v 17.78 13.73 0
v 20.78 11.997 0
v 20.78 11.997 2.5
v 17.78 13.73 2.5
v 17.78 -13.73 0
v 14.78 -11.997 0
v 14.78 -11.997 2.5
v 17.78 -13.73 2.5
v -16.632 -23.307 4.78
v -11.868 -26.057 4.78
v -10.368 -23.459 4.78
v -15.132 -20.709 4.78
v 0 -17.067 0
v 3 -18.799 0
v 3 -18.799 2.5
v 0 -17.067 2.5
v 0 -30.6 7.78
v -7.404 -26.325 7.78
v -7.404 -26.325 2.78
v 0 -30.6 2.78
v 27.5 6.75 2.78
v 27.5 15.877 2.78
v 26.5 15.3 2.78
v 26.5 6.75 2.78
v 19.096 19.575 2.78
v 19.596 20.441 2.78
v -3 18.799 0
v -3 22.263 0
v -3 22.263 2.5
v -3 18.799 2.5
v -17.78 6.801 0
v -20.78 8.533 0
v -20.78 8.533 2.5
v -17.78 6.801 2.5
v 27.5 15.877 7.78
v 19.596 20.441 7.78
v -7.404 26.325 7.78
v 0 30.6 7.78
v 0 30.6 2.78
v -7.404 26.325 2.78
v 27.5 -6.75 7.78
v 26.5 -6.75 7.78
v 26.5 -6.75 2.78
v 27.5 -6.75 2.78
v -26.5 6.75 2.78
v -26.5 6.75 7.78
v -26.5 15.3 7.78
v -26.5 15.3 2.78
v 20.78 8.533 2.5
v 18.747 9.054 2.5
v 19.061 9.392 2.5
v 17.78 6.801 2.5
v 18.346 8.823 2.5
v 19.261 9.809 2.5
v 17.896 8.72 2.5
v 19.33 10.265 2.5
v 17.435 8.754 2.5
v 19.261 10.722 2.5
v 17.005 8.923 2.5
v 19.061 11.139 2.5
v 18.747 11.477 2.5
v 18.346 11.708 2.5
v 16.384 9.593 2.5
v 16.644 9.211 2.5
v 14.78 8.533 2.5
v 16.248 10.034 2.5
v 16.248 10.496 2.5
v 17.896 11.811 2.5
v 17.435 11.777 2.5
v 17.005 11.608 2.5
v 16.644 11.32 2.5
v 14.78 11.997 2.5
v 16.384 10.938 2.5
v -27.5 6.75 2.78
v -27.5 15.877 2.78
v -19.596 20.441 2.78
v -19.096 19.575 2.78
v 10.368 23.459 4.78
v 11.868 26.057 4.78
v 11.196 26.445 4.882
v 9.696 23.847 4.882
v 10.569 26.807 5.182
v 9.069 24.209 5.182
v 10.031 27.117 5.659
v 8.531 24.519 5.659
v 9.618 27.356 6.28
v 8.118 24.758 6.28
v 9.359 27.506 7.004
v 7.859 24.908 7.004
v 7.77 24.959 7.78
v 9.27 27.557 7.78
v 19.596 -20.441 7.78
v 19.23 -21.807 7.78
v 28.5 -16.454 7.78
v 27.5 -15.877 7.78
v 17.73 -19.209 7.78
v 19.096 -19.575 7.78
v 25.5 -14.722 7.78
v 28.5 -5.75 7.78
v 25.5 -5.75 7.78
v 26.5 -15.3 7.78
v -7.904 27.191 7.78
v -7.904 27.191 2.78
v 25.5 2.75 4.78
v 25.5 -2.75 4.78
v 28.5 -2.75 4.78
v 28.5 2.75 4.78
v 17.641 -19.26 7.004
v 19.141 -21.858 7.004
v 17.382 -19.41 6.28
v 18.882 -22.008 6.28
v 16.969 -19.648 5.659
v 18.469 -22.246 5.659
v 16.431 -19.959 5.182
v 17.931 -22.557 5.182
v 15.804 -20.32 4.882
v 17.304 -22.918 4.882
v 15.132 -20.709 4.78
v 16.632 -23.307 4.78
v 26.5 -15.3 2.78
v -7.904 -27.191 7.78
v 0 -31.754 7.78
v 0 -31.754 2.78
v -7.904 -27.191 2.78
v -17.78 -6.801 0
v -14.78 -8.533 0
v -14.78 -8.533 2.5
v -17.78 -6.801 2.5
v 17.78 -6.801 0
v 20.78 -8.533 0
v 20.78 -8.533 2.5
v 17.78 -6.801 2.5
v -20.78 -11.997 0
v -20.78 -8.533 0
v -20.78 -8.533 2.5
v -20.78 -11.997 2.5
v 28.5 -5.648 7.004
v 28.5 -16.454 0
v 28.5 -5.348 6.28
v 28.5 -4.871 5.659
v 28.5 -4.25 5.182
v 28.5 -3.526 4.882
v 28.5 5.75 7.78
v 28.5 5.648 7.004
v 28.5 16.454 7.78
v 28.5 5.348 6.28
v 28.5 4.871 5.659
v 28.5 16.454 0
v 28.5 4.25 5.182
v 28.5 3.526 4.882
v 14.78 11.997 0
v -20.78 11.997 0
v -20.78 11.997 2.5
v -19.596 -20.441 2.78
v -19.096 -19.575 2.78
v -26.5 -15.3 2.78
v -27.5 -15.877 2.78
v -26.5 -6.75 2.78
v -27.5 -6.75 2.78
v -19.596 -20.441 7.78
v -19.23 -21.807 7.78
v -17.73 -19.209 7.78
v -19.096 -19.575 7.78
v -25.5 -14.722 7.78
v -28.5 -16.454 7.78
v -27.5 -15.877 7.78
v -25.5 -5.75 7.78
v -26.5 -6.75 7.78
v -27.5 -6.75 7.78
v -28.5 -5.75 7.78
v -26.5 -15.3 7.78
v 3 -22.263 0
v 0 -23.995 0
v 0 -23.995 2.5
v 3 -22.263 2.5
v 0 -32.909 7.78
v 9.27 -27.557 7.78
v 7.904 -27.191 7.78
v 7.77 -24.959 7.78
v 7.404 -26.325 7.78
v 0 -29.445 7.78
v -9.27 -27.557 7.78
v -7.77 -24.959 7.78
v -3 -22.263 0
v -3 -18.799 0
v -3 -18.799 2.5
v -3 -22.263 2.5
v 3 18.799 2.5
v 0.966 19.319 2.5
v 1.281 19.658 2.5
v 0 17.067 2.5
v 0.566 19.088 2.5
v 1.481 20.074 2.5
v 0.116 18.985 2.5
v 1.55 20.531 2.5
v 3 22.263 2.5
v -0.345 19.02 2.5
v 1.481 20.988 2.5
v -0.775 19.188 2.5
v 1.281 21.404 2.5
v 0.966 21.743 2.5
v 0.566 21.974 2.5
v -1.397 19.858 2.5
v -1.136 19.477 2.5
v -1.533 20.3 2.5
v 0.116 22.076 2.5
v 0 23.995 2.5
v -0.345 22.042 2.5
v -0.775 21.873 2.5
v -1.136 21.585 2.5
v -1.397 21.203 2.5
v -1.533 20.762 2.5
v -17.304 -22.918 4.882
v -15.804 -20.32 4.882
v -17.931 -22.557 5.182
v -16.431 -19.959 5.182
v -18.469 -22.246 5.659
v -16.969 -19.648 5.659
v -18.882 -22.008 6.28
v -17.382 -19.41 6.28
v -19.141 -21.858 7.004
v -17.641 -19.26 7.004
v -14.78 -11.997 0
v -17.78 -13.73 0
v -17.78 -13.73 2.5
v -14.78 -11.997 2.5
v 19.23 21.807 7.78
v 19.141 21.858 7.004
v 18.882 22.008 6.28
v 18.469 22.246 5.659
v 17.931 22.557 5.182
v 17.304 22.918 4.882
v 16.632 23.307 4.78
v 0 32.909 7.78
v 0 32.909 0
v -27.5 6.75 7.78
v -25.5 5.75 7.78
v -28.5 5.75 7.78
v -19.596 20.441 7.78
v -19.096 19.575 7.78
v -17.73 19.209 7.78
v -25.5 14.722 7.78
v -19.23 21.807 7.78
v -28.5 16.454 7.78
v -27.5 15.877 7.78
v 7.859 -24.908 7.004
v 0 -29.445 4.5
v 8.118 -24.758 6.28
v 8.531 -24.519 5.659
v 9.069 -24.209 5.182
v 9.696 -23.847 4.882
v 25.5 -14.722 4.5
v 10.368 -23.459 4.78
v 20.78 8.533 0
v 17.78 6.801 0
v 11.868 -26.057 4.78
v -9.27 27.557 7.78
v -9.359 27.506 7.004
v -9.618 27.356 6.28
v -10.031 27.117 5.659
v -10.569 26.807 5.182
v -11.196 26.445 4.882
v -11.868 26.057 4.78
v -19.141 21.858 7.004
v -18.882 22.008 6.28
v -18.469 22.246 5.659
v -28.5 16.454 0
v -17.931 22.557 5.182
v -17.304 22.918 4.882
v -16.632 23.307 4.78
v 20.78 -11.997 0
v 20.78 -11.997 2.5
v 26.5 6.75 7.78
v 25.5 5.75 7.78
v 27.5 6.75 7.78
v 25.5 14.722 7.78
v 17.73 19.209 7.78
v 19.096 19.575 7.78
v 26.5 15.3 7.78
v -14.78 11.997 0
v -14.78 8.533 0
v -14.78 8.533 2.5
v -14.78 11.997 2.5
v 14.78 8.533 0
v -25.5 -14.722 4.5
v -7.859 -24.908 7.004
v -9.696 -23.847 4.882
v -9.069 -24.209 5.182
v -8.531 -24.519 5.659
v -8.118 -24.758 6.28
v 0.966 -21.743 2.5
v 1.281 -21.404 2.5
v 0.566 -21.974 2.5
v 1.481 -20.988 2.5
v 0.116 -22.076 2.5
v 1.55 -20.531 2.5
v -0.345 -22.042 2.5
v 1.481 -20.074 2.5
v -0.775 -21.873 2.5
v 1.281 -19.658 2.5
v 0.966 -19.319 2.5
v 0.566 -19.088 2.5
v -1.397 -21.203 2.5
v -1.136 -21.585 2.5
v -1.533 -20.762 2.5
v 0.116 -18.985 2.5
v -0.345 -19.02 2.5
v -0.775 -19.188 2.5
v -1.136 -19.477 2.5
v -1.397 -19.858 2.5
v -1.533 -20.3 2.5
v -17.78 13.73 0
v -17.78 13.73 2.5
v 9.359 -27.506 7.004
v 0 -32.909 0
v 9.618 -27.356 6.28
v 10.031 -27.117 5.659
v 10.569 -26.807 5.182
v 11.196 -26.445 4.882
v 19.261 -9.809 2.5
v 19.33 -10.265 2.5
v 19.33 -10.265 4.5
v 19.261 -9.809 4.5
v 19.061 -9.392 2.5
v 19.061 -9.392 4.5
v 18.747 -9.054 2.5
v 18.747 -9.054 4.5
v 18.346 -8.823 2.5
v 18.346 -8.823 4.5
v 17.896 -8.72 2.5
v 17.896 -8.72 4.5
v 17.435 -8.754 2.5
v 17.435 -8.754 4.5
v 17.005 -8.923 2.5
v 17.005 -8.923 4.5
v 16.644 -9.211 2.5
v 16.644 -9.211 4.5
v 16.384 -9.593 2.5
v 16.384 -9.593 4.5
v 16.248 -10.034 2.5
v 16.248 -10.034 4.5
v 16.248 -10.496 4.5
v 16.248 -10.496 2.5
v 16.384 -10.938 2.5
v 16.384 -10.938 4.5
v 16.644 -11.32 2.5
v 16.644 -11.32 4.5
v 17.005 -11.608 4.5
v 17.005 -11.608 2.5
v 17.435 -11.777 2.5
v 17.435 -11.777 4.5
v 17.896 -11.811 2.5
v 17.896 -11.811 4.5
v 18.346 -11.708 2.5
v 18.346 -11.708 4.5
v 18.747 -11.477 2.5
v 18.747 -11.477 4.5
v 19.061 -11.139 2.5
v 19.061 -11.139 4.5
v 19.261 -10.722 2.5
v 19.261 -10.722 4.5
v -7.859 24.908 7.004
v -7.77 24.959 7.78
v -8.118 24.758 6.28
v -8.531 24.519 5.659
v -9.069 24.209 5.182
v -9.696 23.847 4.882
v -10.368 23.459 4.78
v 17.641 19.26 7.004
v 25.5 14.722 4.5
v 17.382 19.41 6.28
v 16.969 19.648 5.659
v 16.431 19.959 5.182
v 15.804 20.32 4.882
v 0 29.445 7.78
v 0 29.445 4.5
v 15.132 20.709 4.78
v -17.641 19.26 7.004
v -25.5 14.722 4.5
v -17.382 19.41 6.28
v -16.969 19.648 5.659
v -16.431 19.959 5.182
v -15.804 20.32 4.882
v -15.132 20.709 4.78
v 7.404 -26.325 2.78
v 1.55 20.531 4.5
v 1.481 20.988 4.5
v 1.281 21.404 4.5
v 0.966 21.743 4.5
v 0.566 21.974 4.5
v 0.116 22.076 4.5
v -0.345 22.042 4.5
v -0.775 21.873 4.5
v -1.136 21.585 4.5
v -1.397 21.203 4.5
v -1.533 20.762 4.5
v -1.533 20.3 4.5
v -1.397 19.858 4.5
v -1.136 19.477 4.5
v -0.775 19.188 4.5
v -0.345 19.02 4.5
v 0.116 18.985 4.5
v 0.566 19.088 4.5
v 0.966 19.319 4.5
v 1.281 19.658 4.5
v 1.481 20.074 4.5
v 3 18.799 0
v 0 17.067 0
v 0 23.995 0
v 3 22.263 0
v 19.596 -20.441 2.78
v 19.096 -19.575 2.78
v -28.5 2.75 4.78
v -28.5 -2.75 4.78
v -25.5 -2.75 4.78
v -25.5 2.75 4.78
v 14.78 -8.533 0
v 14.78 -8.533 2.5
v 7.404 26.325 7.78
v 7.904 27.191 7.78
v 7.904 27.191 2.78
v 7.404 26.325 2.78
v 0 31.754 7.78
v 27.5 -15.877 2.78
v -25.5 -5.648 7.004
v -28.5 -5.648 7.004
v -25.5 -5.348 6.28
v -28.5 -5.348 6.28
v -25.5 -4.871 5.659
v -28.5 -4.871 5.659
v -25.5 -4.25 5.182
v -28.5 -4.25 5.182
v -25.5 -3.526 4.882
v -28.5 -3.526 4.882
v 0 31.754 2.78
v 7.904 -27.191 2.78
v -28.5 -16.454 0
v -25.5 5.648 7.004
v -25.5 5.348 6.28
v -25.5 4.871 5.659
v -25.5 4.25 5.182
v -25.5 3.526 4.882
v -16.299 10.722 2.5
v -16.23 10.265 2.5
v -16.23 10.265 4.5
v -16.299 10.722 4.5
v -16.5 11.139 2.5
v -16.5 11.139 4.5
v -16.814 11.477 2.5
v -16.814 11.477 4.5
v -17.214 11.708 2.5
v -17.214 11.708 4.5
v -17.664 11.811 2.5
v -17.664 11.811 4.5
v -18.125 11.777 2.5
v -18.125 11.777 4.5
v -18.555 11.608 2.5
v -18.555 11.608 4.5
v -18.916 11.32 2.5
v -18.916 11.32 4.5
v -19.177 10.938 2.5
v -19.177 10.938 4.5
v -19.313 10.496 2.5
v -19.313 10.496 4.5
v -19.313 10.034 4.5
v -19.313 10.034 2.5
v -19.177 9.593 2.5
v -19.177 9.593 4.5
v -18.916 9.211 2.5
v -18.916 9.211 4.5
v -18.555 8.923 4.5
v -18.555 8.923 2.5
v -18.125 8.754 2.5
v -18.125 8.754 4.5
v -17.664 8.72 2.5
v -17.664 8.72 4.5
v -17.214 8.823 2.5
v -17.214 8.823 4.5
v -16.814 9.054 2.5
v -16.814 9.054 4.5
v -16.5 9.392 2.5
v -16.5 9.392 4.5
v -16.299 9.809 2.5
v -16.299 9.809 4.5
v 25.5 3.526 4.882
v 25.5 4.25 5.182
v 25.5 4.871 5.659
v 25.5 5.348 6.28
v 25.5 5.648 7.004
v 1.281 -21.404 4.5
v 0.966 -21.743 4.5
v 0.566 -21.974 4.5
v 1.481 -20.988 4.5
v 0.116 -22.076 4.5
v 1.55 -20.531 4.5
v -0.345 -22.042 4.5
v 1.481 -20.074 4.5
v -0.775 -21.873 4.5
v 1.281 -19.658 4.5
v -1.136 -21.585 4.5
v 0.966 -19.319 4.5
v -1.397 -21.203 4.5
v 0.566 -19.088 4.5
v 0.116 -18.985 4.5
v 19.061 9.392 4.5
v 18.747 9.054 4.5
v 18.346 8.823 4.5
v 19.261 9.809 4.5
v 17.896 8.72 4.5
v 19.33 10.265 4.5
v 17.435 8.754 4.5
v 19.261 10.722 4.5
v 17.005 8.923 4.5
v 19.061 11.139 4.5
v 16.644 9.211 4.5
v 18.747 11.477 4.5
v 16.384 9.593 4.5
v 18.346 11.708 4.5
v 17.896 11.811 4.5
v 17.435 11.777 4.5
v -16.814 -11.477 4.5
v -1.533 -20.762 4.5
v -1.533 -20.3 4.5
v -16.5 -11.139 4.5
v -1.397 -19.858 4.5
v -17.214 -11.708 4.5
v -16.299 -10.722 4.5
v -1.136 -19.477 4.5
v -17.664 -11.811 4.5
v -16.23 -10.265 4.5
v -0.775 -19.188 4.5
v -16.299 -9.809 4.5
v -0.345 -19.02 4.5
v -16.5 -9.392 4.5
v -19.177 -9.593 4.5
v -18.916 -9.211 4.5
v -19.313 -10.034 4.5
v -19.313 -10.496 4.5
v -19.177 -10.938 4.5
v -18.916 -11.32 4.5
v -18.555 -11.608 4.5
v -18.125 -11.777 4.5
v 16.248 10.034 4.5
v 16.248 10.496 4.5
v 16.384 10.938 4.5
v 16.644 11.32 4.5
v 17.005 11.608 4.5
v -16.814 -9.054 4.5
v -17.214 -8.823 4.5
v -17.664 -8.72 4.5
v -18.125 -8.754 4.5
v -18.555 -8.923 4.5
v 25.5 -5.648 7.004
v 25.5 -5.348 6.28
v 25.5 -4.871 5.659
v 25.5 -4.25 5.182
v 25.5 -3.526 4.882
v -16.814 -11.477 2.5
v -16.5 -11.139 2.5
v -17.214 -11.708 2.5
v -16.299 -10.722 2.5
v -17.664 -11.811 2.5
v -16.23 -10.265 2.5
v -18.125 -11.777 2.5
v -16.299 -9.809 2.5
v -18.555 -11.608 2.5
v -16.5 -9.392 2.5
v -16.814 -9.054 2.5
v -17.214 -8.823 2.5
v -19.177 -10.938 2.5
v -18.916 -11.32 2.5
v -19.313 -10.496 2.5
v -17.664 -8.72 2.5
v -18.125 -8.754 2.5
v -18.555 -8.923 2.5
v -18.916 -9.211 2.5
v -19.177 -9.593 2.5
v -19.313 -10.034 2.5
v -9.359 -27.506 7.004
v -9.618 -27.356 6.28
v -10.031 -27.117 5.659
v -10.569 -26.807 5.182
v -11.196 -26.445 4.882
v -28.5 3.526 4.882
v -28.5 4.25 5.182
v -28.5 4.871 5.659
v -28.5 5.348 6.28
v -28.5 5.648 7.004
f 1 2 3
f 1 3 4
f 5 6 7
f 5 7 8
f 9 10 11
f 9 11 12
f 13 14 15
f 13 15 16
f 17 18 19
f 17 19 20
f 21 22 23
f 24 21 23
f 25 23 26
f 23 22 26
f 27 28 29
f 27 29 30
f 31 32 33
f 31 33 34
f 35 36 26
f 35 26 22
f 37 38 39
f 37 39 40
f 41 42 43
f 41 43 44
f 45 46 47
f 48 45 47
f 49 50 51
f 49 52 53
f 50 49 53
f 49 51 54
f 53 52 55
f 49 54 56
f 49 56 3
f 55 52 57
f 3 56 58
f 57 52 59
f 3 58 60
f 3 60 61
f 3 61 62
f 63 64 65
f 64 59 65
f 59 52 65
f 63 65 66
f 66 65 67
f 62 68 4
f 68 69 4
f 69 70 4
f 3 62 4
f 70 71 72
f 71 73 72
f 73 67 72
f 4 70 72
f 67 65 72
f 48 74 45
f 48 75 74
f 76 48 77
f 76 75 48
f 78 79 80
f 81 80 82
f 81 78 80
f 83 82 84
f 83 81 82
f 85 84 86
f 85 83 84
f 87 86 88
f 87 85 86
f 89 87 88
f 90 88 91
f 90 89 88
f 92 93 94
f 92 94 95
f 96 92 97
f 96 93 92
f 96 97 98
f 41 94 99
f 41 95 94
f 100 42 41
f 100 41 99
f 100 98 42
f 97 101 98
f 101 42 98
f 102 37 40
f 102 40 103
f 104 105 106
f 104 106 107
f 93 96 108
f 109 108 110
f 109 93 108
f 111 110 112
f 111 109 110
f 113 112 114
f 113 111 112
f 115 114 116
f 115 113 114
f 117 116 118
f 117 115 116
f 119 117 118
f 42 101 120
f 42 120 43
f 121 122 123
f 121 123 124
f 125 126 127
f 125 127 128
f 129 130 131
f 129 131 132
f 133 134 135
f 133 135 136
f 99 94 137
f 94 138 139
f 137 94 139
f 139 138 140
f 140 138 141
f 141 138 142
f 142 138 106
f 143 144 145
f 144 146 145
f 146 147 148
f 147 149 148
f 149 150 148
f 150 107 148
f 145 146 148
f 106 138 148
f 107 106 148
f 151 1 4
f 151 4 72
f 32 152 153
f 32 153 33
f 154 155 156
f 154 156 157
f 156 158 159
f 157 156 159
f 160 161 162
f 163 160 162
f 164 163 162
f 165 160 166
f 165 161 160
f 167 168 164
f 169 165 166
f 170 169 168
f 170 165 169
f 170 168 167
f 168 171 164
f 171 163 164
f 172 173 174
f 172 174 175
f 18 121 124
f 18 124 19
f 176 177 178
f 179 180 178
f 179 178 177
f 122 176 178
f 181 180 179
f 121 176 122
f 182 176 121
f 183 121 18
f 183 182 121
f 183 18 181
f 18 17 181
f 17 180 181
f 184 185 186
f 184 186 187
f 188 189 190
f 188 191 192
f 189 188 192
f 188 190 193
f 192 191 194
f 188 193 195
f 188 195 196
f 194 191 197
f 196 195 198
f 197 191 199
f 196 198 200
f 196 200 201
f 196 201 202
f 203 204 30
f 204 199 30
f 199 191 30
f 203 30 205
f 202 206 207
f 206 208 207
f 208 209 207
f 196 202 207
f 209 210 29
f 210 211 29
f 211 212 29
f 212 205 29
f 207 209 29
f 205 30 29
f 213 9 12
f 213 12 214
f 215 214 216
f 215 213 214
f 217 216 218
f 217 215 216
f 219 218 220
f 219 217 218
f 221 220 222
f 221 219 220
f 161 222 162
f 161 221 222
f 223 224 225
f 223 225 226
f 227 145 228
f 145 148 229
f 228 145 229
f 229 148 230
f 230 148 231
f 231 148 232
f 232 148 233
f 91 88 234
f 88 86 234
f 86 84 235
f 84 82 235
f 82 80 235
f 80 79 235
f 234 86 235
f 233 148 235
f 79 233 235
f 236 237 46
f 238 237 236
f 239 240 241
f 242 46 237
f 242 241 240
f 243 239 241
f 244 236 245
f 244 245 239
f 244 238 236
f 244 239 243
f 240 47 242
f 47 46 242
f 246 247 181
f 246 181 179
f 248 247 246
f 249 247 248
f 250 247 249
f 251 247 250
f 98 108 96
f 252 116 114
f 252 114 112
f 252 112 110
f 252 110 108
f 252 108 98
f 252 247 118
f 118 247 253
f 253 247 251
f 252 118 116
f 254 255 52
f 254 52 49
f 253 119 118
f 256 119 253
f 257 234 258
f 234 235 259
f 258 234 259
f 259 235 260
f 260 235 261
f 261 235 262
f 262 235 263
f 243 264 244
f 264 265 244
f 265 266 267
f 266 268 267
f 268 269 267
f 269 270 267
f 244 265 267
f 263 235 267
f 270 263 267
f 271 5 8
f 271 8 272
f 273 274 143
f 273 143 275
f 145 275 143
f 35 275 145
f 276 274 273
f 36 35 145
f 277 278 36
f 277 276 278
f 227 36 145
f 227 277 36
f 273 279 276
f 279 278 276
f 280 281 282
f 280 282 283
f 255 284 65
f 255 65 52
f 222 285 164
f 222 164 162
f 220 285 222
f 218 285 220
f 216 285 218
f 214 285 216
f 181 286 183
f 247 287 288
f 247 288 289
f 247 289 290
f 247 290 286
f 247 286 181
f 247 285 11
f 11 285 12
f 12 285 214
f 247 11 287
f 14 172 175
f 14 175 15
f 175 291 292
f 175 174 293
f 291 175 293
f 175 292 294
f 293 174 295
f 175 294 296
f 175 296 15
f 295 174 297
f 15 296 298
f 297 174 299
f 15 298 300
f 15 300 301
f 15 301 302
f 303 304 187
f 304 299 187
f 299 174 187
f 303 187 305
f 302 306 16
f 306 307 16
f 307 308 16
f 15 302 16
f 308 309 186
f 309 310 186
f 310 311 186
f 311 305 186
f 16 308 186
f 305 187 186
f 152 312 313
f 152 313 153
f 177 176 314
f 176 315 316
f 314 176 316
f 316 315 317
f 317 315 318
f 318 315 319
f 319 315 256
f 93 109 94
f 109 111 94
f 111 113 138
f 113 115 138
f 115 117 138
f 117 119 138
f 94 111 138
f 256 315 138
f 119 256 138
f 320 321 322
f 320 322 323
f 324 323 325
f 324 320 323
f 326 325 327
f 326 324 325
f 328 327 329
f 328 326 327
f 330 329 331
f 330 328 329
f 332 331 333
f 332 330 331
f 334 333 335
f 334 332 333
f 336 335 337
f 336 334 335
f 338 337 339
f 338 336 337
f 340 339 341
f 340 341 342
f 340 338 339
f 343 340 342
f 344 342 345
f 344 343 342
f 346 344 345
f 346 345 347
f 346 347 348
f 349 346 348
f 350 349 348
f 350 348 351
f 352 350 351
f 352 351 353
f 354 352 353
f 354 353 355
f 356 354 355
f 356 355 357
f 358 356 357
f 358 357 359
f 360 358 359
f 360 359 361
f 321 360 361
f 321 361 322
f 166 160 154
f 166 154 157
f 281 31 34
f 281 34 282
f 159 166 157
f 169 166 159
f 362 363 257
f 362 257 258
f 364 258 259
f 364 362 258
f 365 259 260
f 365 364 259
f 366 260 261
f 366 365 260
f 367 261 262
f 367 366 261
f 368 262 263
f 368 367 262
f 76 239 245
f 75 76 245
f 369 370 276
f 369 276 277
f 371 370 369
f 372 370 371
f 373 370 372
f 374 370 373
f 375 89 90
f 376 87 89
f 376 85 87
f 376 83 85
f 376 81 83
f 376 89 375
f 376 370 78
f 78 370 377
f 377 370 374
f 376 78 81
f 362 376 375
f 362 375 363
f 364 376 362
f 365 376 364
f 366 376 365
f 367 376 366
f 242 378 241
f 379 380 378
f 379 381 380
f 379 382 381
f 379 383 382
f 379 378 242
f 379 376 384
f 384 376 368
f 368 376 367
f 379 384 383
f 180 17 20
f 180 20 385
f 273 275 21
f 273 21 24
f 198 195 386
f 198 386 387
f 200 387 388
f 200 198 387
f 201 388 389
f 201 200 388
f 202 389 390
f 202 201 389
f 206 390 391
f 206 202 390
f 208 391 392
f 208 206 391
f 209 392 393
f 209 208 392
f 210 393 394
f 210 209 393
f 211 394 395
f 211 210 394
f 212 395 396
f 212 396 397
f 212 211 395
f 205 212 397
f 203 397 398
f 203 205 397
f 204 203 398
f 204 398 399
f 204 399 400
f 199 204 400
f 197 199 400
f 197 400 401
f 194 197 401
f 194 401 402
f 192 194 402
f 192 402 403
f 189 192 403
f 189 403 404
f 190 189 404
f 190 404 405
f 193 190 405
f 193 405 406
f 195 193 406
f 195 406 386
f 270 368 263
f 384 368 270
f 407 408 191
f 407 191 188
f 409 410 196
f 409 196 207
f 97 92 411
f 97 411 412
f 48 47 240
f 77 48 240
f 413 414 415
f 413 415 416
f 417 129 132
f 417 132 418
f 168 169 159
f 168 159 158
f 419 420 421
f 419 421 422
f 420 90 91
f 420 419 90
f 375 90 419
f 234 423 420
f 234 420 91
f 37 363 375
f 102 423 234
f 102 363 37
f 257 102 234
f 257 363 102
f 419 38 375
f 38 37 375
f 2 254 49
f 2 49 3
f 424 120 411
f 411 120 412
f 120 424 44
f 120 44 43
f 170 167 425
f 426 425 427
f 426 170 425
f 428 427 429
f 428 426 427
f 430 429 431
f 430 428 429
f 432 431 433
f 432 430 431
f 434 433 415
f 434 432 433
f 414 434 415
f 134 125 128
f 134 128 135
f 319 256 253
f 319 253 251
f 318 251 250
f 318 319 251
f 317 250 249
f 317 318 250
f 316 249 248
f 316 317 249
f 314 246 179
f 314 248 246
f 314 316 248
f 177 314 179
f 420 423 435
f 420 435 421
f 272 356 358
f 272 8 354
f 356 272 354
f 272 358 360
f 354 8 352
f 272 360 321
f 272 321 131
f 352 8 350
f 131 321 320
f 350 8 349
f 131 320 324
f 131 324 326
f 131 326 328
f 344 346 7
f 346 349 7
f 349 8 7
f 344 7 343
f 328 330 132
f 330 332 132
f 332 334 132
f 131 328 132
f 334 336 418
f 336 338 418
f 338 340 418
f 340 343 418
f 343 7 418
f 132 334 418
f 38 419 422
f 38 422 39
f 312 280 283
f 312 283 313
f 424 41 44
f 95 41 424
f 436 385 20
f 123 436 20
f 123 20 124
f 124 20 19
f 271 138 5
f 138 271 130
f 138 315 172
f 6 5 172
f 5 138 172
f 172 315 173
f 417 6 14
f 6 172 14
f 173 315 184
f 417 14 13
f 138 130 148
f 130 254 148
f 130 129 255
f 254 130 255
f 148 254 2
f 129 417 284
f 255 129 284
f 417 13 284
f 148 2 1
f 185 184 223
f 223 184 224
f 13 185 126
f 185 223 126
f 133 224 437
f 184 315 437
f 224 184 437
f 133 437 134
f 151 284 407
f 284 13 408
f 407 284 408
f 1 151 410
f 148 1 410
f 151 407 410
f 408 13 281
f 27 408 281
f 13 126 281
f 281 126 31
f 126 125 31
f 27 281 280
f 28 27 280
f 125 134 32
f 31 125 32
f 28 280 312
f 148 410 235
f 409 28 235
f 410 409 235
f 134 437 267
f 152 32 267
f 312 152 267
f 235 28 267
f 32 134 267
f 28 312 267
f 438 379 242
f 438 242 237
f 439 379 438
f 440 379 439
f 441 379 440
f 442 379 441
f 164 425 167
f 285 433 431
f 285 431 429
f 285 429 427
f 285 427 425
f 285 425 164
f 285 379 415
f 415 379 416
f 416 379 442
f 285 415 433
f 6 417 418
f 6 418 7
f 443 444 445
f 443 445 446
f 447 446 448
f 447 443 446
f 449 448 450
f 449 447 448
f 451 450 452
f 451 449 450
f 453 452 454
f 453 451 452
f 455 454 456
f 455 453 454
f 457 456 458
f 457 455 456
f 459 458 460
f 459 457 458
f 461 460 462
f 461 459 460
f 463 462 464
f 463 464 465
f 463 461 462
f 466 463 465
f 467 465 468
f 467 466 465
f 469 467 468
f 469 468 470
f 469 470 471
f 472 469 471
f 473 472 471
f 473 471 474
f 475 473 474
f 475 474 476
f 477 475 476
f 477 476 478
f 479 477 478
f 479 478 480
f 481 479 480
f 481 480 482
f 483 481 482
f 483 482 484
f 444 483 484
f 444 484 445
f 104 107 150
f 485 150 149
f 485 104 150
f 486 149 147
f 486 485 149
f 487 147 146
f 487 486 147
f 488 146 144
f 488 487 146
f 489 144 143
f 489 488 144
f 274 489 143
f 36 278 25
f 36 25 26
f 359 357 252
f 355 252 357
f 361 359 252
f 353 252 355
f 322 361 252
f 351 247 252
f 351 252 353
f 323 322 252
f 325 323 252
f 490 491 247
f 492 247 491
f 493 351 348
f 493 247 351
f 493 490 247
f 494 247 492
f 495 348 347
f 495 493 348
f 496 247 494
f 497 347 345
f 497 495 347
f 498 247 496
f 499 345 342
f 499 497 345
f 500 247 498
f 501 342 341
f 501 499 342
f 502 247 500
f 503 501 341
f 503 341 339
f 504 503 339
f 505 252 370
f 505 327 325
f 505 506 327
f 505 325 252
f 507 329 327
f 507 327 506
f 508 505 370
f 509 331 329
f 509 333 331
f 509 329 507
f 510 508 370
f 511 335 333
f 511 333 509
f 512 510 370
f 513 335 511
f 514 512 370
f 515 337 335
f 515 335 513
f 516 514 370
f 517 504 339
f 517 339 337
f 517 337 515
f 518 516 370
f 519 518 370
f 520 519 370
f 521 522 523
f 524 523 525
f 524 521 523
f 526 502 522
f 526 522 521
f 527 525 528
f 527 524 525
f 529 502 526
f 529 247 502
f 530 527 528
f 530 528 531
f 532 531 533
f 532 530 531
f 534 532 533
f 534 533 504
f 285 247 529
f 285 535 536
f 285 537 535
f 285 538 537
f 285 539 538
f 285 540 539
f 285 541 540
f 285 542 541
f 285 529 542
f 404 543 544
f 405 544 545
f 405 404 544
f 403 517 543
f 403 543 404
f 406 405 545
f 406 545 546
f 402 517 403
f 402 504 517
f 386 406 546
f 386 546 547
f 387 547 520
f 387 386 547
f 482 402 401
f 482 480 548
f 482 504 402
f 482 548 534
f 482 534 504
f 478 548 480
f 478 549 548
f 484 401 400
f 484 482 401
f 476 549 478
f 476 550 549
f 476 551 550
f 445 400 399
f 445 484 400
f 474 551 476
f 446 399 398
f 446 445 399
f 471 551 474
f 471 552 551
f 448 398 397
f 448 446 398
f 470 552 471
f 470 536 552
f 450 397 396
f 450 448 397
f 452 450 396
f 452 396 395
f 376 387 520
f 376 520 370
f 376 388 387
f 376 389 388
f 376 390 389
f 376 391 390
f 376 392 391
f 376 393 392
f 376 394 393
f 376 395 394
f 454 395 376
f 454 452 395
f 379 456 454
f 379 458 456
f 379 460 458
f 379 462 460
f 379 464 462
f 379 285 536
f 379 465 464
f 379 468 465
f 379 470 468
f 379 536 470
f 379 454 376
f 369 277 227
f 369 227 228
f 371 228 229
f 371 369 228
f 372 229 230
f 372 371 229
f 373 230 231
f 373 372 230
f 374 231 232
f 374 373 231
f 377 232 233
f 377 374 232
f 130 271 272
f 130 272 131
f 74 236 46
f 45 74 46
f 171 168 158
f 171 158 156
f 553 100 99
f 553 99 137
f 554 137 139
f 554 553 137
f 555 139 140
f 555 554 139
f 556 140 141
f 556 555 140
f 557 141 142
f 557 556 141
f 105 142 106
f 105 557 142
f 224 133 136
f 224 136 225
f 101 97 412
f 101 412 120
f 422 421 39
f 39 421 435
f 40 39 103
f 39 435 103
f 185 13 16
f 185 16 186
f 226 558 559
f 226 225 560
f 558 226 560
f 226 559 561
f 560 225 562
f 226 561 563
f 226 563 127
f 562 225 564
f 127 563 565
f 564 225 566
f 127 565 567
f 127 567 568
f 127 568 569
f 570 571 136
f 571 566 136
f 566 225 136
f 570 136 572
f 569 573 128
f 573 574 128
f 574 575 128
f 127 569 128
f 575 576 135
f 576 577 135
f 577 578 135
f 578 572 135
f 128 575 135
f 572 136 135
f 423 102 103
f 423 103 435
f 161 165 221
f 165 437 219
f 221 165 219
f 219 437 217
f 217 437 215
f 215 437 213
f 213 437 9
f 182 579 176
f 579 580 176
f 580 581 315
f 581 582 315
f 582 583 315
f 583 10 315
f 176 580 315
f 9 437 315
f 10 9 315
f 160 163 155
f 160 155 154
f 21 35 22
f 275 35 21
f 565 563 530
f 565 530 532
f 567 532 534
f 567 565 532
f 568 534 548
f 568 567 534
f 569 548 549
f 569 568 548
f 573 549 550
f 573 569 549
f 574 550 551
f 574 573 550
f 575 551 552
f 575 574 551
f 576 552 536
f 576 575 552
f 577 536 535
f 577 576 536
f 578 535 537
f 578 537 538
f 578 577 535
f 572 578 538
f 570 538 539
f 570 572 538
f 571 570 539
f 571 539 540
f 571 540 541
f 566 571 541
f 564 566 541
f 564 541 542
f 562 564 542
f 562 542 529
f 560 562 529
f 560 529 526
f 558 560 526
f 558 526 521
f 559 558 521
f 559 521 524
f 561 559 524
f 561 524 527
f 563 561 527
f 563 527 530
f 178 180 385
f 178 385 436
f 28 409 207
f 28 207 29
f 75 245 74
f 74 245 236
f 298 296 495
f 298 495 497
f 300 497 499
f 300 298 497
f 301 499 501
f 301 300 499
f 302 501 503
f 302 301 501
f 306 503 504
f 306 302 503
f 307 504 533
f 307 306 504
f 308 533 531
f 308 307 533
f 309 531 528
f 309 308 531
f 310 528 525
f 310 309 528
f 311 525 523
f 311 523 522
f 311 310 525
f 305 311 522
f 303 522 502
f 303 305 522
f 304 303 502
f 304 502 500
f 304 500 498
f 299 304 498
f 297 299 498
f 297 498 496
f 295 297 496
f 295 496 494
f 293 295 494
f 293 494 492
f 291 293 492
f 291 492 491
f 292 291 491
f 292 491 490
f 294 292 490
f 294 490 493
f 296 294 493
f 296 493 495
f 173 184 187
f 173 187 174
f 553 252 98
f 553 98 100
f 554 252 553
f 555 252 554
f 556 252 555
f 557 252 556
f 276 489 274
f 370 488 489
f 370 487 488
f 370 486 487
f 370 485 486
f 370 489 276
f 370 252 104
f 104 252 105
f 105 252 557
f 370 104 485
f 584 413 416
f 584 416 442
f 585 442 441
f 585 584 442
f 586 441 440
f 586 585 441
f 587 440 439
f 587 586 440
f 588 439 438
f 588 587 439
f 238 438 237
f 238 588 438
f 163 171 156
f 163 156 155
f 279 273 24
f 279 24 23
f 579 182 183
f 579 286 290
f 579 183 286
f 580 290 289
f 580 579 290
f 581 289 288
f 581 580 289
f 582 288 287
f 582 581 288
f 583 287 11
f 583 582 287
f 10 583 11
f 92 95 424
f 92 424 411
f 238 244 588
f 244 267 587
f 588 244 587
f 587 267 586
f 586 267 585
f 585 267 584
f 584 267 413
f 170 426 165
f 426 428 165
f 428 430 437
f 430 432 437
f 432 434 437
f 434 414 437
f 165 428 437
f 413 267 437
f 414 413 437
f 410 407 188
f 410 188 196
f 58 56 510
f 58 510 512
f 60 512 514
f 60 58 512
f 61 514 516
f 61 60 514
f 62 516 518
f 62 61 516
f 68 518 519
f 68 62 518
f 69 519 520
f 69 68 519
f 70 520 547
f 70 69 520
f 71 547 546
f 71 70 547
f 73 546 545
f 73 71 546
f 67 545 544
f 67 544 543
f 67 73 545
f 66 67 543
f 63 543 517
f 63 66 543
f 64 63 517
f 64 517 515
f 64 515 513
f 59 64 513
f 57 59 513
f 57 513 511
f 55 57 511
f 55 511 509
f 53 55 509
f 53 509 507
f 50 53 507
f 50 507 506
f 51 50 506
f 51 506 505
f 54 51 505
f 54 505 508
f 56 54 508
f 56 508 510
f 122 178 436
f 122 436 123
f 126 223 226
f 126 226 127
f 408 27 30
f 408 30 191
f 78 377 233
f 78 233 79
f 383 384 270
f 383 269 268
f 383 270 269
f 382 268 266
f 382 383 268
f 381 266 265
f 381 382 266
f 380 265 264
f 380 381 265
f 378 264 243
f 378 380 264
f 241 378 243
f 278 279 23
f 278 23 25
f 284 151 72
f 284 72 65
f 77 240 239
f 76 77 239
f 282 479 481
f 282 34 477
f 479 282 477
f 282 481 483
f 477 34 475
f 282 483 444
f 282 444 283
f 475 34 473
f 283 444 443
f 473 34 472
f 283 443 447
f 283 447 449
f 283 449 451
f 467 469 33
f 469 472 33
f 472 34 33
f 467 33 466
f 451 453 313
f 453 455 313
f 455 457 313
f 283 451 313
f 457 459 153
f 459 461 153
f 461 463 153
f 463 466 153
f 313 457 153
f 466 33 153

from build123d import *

# Parameters (mm, degrees)
SKETCH1_R           = 1.55
BOSS_EXTRUDE1_DEPTH = 4.5
SKETCH1_4_R         = 1.55
CUT_EXTRUDE1_DEPTH  = 2.5
BOSS_EXTRUDE2_DEPTH = 7.78
CUT_EXTRUDE2_REACH  = 68.276
CUT_EXTRUDE3_REACH  = 74.144
CUT_EXTRUDE4_REACH  = 74.144
CUT_EXTRUDE5_DEPTH  = 5


with BuildPart() as part:
    # Sketch1 → Boss-Extrude1 (new body)
    # profile 1 of 8: a face of its own
    with BuildSketch(Plane(origin=(0, 0, 0), x_dir=(0, 1, 0), z_dir=(0, 0, 1))):
        Polygon((-16.454482672, -28.5), (16.454482672, -28.5), (32.908965344, 0), (16.454482672, 28.5), (-16.454482672, 28.5), (-32.908965344, 0), align=None)
        Polygon((14.722431864, -25.5), (29.444863729, 0), (14.722431864, 25.5), (-14.722431864, 25.5), (-29.444863729, 0), (-14.722431864, -25.5), align=None, mode=Mode.SUBTRACT)
    # profile 2 of 8: a face of its own
    with BuildSketch(Plane(origin=(0, 0, 0), x_dir=(0, 1, 0), z_dir=(0, 0, 1))):
        Polygon((-14.722431864, -25.5), (14.722431864, -25.5), (29.444863729, 0), (14.722431864, 25.5), (-14.722431864, 25.5), (-29.444863729, 0), align=None)
        Polygon((-18.798769192, -3), (-17.066718385, 0), (-18.798769192, 3), (-22.262870808, 3), (-23.994921615, 0), (-22.262870808, -3), align=None, mode=Mode.SUBTRACT)
        Polygon((-8.533359192, -20.780211681), (-6.801308385, -17.780211681), (-8.533359192, -14.780211681), (-11.997460808, -14.780211681), (-13.729511615, -17.780211681), (-11.997460808, -20.780211681), align=None, mode=Mode.SUBTRACT)
        Polygon((11.997460808, -20.780211681), (13.729511615, -17.780211681), (11.997460808, -14.780211681), (8.533359192, -14.780211681), (6.801308385, -17.780211681), (8.533359192, -20.780211681), align=None, mode=Mode.SUBTRACT)
        Polygon((22.262870808, -3), (23.994921615, 0), (22.262870808, 3), (18.798769192, 3), (17.066718385, 0), (18.798769192, -3), align=None, mode=Mode.SUBTRACT)
        Polygon((11.997460808, 14.780211681), (13.729511615, 17.780211681), (11.997460808, 20.780211681), (8.533359192, 20.780211681), (6.801308385, 17.780211681), (8.533359192, 14.780211681), align=None, mode=Mode.SUBTRACT)
        Polygon((-8.533359192, 14.780211681), (-6.801308385, 17.780211681), (-8.533359192, 20.780211681), (-11.997460808, 20.780211681), (-13.729511615, 17.780211681), (-11.997460808, 14.780211681), align=None, mode=Mode.SUBTRACT)
    # profile 3 of 8: a face of its own
    with BuildSketch(Plane(origin=(0, 0, 0), x_dir=(0, 1, 0), z_dir=(0, 0, 1))):
        Polygon((8.533359192, -20.780211681), (11.997460808, -20.780211681), (13.729511615, -17.780211681), (11.997460808, -14.780211681), (8.533359192, -14.780211681), (6.801308385, -17.780211681), align=None)
        with Locations(Location((10.26541, -17.780211681, 0), (0, 0, 270))):
            Circle(SKETCH1_R, mode=Mode.SUBTRACT)
    # profile 4 of 8: a face of its own
    with BuildSketch(Plane(origin=(0, 0, 0), x_dir=(0, 1, 0), z_dir=(0, 0, 1))):
        Polygon((-11.997460808, -20.780211681), (-8.533359192, -20.780211681), (-6.801308385, -17.780211681), (-8.533359192, -14.780211681), (-11.997460808, -14.780211681), (-13.729511615, -17.780211681), align=None)
        with Locations(Location((-10.26541, -17.780211681, 0), (0, 0, 270))):
            Circle(SKETCH1_R, mode=Mode.SUBTRACT)
    # profile 5 of 8: a face of its own
    with BuildSketch(Plane(origin=(0, 0, 0), x_dir=(0, 1, 0), z_dir=(0, 0, 1))):
        Polygon((-22.262870808, -3), (-18.798769192, -3), (-17.066718385, 0), (-18.798769192, 3), (-22.262870808, 3), (-23.994921615, 0), align=None)
        with Locations(Location((-20.53082, 0, 0), (0, 0, 270))):
            Circle(SKETCH1_R, mode=Mode.SUBTRACT)
    # profile 6 of 8: a face of its own
    with BuildSketch(Plane(origin=(0, 0, 0), x_dir=(0, 1, 0), z_dir=(0, 0, 1))):
        Polygon((-11.997460808, 14.780211681), (-8.533359192, 14.780211681), (-6.801308385, 17.780211681), (-8.533359192, 20.780211681), (-11.997460808, 20.780211681), (-13.729511615, 17.780211681), align=None)
        with Locations(Location((-10.26541, 17.780211681, 0), (0, 0, 270))):
            Circle(SKETCH1_R, mode=Mode.SUBTRACT)
    # profile 7 of 8: a face of its own
    with BuildSketch(Plane(origin=(0, 0, 0), x_dir=(0, 1, 0), z_dir=(0, 0, 1))):
        Polygon((8.533359192, 14.780211681), (11.997460808, 14.780211681), (13.729511615, 17.780211681), (11.997460808, 20.780211681), (8.533359192, 20.780211681), (6.801308385, 17.780211681), align=None)
        with Locations(Location((10.26541, 17.780211681, 0), (0, 0, 270))):
            Circle(SKETCH1_R, mode=Mode.SUBTRACT)
    # profile 8 of 8: a face of its own
    with BuildSketch(Plane(origin=(0, 0, 0), x_dir=(0, 1, 0), z_dir=(0, 0, 1))):
        Polygon((18.798769192, -3), (22.262870808, -3), (23.994921615, 0), (22.262870808, 3), (18.798769192, 3), (17.066718385, 0), align=None)
        with Locations(Location((20.53082, 0, 0), (0, 0, 270))):
            Circle(SKETCH1_R, mode=Mode.SUBTRACT)
    extrude(amount=BOSS_EXTRUDE1_DEPTH)

    # Sketch1<4> → Cut-Extrude1 (cut)
    # profile 1 of 6: a face of its own
    with BuildSketch(Plane(origin=(0, 0, 0), x_dir=(0, 1, 0), z_dir=(0, 0, 1))):
        Polygon((-11.997460808, 14.780211681), (-8.533359192, 14.780211681), (-6.801308385, 17.780211681), (-8.533359192, 20.780211681), (-11.997460808, 20.780211681), (-13.729511615, 17.780211681), align=None)
        with Locations(Location((-10.26541, 17.780211681, 0), (0, 0, 270))):
            Circle(SKETCH1_4_R, mode=Mode.SUBTRACT)
    # profile 2 of 6: a face of its own
    with BuildSketch(Plane(origin=(0, 0, 0), x_dir=(0, 1, 0), z_dir=(0, 0, 1))):
        Polygon((-22.262870808, -3), (-18.798769192, -3), (-17.066718385, 0), (-18.798769192, 3), (-22.262870808, 3), (-23.994921615, 0), align=None)
        with Locations(Location((-20.53082, 0, 0), (0, 0, 270))):
            Circle(SKETCH1_4_R, mode=Mode.SUBTRACT)
    # profile 3 of 6: a face of its own
    with BuildSketch(Plane(origin=(0, 0, 0), x_dir=(0, 1, 0), z_dir=(0, 0, 1))):
        Polygon((-11.997460808, -20.780211681), (-8.533359192, -20.780211681), (-6.801308385, -17.780211681), (-8.533359192, -14.780211681), (-11.997460808, -14.780211681), (-13.729511615, -17.780211681), align=None)
        with Locations(Location((-10.26541, -17.780211681, 0), (0, 0, 270))):
            Circle(SKETCH1_4_R, mode=Mode.SUBTRACT)
    # profile 4 of 6: a face of its own
    with BuildSketch(Plane(origin=(0, 0, 0), x_dir=(0, 1, 0), z_dir=(0, 0, 1))):
        Polygon((8.533359192, -20.780211681), (11.997460808, -20.780211681), (13.729511615, -17.780211681), (11.997460808, -14.780211681), (8.533359192, -14.780211681), (6.801308385, -17.780211681), align=None)
        with Locations(Location((10.26541, -17.780211681, 0), (0, 0, 270))):
            Circle(SKETCH1_4_R, mode=Mode.SUBTRACT)
    # profile 5 of 6: a face of its own
    with BuildSketch(Plane(origin=(0, 0, 0), x_dir=(0, 1, 0), z_dir=(0, 0, 1))):
        Polygon((18.798769192, -3), (22.262870808, -3), (23.994921615, 0), (22.262870808, 3), (18.798769192, 3), (17.066718385, 0), align=None)
        with Locations(Location((20.53082, 0, 0), (0, 0, 270))):
            Circle(SKETCH1_4_R, mode=Mode.SUBTRACT)
    # profile 6 of 6: a face of its own
    with BuildSketch(Plane(origin=(0, 0, 0), x_dir=(0, 1, 0), z_dir=(0, 0, 1))):
        Polygon((8.533359192, 14.780211681), (11.997460808, 14.780211681), (13.729511615, 17.780211681), (11.997460808, 20.780211681), (8.533359192, 20.780211681), (6.801308385, 17.780211681), align=None)
        with Locations(Location((10.26541, 17.780211681, 0), (0, 0, 270))):
            Circle(SKETCH1_4_R, mode=Mode.SUBTRACT)
    extrude(amount=CUT_EXTRUDE1_DEPTH, mode=Mode.SUBTRACT)

    # Sketch1<5> → Boss-Extrude2 (add)
    with BuildSketch(Plane(origin=(0, 0, 0), x_dir=(0, 1, 0), z_dir=(0, 0, 1))):
        Polygon((-16.454482672, -28.5), (16.454482672, -28.5), (32.908965344, 0), (16.454482672, 28.5), (-16.454482672, 28.5), (-32.908965344, 0), align=None)
        Polygon((14.722431864, -25.5), (29.444863729, 0), (14.722431864, 25.5), (-14.722431864, 25.5), (-29.444863729, 0), (-14.722431864, -25.5), align=None, mode=Mode.SUBTRACT)
    extrude(amount=BOSS_EXTRUDE2_DEPTH)

    # Cut-Extrude2: up to this face of the body (flat: up to its plane)
    cut_extrude2_end = Plane(part.part.faces().sort_by_distance((28.5, 0, 3.89))[0])
    # Sketch2 → Cut-Extrude2 (cut, up to the picked face)
    with BuildSketch(Plane(origin=(-28.5, 0, 0), x_dir=(0, -1, 0), z_dir=(-1, 0, 0)), mode=Mode.PRIVATE) as cut_extrude2_sk1:
        with BuildLine():
            Line((-2.75, 10.78), (2.75, 10.78))
            ThreePointArc((2.75, 10.78), (5.75, 7.78), (2.75, 4.78))
            Line((2.75, 4.78), (-2.75, 4.78))
            ThreePointArc((-2.75, 4.78), (-5.75, 7.78), (-2.75, 10.78))
        make_face()
    cut_extrude2_tool1 = split(extrude(cut_extrude2_sk1.sketch, amount=-CUT_EXTRUDE2_REACH, mode=Mode.PRIVATE), bisect_by=cut_extrude2_end, keep=Keep.BOTH, mode=Mode.PRIVATE)
    add(cut_extrude2_tool1.solids().sort_by(Axis((-28.5, 0, 7.78), (1, 0, 0)))[0], mode=Mode.SUBTRACT)

    # Cut-Extrude3: up to this face of the body (flat: up to its plane)
    cut_extrude3_end = Plane(part.part.faces().sort_by_distance((14.25, 24.681724008, 3.89))[0])
    # Sketch3 → Cut-Extrude3 (cut, up to the picked face)
    with BuildSketch(Plane(origin=(-14.25, -24.681724008, 0), x_dir=(0.8660254037844387, -0.49999999999999983, 0), z_dir=(-0.49999999999999983, -0.8660254037844387, 0)), mode=Mode.PRIVATE) as cut_extrude3_sk1:
        with BuildLine():
            Line((-2.75, 10.78), (2.75, 10.78))
            ThreePointArc((2.75, 10.78), (5.75, 7.78), (2.75, 4.78))
            Line((2.75, 4.78), (-2.75, 4.78))
            ThreePointArc((-2.75, 4.78), (-5.75, 7.78), (-2.75, 10.78))
        make_face()
    cut_extrude3_tool1 = split(extrude(cut_extrude3_sk1.sketch, amount=-CUT_EXTRUDE3_REACH, mode=Mode.PRIVATE), bisect_by=cut_extrude3_end, keep=Keep.BOTH, mode=Mode.PRIVATE)
    add(cut_extrude3_tool1.solids().sort_by(Axis((-14.25, -24.681724, 7.78), (0.49999999999999983, 0.8660254037844387, 0)))[0], mode=Mode.SUBTRACT)

    # Cut-Extrude4: up to this face of the body (flat: up to its plane)
    cut_extrude4_end = Plane(part.part.faces().sort_by_distance((-14.25, 24.681724008, 3.89))[0])
    # Sketch4 → Cut-Extrude4 (cut, up to the picked face)
    with BuildSketch(Plane(origin=(14.25, -24.681724008, 0), x_dir=(0.8660254037844385, 0.5000000000000004, 0), z_dir=(0.5000000000000003, -0.8660254037844384, 0)), mode=Mode.PRIVATE) as cut_extrude4_sk1:
        with BuildLine():
            Line((-2.75, 10.78), (2.75, 10.78))
            ThreePointArc((2.75, 10.78), (5.75, 7.78), (2.75, 4.78))
            Line((2.75, 4.78), (-2.75, 4.78))
            ThreePointArc((-2.75, 4.78), (-5.75, 7.78), (-2.75, 10.78))
        make_face()
    cut_extrude4_tool1 = split(extrude(cut_extrude4_sk1.sketch, amount=-CUT_EXTRUDE4_REACH, mode=Mode.PRIVATE), bisect_by=cut_extrude4_end, keep=Keep.BOTH, mode=Mode.PRIVATE)
    add(cut_extrude4_tool1.solids().sort_by(Axis((14.25, -24.681724, 7.78), (-0.5000000000000003, 0.8660254037844384, 0)))[0], mode=Mode.SUBTRACT)

    # Sketch7 → Cut-Extrude5 (cut)
    with BuildSketch(Plane.XY.offset(7.78)):
        Polygon((-26.5, -6.75), (-26.5, -15.299782134), (-19.095671476, -19.5746732), (-19.595671476, -20.440698604), (-27.5, -15.877132403), (-27.5, -6.75), align=None)
        Polygon((-27.5, 6.75), (-26.5, 6.75), (-26.5, 15.299782134), (-19.095671476, 19.5746732), (-19.595671476, 20.440698604), (-27.5, 15.877132403), align=None)
        Polygon((-7.404328524, -26.3246732), (0, -30.599564267), (7.404328524, -26.3246732), (7.904328524, -27.190698604), (0, -31.754264805), (-7.904328524, -27.190698604), align=None)
        Polygon((19.095671476, -19.5746732), (26.5, -15.299782134), (26.5, -6.75), (27.5, -6.75), (27.5, -15.877132403), (19.595671476, -20.440698604), align=None)
        Polygon((26.5, 6.75), (26.5, 15.299782134), (19.095671476, 19.5746732), (19.595671476, 20.440698604), (27.5, 15.877132403), (27.5, 6.75), align=None)
        Polygon((7.404328524, 26.3246732), (0, 30.599564267), (-7.404328524, 26.3246732), (-7.904328524, 27.190698604), (0, 31.754264805), (7.904328524, 27.190698604), align=None)
    extrude(amount=-CUT_EXTRUDE5_DEPTH, mode=Mode.SUBTRACT)


solid = part.part
